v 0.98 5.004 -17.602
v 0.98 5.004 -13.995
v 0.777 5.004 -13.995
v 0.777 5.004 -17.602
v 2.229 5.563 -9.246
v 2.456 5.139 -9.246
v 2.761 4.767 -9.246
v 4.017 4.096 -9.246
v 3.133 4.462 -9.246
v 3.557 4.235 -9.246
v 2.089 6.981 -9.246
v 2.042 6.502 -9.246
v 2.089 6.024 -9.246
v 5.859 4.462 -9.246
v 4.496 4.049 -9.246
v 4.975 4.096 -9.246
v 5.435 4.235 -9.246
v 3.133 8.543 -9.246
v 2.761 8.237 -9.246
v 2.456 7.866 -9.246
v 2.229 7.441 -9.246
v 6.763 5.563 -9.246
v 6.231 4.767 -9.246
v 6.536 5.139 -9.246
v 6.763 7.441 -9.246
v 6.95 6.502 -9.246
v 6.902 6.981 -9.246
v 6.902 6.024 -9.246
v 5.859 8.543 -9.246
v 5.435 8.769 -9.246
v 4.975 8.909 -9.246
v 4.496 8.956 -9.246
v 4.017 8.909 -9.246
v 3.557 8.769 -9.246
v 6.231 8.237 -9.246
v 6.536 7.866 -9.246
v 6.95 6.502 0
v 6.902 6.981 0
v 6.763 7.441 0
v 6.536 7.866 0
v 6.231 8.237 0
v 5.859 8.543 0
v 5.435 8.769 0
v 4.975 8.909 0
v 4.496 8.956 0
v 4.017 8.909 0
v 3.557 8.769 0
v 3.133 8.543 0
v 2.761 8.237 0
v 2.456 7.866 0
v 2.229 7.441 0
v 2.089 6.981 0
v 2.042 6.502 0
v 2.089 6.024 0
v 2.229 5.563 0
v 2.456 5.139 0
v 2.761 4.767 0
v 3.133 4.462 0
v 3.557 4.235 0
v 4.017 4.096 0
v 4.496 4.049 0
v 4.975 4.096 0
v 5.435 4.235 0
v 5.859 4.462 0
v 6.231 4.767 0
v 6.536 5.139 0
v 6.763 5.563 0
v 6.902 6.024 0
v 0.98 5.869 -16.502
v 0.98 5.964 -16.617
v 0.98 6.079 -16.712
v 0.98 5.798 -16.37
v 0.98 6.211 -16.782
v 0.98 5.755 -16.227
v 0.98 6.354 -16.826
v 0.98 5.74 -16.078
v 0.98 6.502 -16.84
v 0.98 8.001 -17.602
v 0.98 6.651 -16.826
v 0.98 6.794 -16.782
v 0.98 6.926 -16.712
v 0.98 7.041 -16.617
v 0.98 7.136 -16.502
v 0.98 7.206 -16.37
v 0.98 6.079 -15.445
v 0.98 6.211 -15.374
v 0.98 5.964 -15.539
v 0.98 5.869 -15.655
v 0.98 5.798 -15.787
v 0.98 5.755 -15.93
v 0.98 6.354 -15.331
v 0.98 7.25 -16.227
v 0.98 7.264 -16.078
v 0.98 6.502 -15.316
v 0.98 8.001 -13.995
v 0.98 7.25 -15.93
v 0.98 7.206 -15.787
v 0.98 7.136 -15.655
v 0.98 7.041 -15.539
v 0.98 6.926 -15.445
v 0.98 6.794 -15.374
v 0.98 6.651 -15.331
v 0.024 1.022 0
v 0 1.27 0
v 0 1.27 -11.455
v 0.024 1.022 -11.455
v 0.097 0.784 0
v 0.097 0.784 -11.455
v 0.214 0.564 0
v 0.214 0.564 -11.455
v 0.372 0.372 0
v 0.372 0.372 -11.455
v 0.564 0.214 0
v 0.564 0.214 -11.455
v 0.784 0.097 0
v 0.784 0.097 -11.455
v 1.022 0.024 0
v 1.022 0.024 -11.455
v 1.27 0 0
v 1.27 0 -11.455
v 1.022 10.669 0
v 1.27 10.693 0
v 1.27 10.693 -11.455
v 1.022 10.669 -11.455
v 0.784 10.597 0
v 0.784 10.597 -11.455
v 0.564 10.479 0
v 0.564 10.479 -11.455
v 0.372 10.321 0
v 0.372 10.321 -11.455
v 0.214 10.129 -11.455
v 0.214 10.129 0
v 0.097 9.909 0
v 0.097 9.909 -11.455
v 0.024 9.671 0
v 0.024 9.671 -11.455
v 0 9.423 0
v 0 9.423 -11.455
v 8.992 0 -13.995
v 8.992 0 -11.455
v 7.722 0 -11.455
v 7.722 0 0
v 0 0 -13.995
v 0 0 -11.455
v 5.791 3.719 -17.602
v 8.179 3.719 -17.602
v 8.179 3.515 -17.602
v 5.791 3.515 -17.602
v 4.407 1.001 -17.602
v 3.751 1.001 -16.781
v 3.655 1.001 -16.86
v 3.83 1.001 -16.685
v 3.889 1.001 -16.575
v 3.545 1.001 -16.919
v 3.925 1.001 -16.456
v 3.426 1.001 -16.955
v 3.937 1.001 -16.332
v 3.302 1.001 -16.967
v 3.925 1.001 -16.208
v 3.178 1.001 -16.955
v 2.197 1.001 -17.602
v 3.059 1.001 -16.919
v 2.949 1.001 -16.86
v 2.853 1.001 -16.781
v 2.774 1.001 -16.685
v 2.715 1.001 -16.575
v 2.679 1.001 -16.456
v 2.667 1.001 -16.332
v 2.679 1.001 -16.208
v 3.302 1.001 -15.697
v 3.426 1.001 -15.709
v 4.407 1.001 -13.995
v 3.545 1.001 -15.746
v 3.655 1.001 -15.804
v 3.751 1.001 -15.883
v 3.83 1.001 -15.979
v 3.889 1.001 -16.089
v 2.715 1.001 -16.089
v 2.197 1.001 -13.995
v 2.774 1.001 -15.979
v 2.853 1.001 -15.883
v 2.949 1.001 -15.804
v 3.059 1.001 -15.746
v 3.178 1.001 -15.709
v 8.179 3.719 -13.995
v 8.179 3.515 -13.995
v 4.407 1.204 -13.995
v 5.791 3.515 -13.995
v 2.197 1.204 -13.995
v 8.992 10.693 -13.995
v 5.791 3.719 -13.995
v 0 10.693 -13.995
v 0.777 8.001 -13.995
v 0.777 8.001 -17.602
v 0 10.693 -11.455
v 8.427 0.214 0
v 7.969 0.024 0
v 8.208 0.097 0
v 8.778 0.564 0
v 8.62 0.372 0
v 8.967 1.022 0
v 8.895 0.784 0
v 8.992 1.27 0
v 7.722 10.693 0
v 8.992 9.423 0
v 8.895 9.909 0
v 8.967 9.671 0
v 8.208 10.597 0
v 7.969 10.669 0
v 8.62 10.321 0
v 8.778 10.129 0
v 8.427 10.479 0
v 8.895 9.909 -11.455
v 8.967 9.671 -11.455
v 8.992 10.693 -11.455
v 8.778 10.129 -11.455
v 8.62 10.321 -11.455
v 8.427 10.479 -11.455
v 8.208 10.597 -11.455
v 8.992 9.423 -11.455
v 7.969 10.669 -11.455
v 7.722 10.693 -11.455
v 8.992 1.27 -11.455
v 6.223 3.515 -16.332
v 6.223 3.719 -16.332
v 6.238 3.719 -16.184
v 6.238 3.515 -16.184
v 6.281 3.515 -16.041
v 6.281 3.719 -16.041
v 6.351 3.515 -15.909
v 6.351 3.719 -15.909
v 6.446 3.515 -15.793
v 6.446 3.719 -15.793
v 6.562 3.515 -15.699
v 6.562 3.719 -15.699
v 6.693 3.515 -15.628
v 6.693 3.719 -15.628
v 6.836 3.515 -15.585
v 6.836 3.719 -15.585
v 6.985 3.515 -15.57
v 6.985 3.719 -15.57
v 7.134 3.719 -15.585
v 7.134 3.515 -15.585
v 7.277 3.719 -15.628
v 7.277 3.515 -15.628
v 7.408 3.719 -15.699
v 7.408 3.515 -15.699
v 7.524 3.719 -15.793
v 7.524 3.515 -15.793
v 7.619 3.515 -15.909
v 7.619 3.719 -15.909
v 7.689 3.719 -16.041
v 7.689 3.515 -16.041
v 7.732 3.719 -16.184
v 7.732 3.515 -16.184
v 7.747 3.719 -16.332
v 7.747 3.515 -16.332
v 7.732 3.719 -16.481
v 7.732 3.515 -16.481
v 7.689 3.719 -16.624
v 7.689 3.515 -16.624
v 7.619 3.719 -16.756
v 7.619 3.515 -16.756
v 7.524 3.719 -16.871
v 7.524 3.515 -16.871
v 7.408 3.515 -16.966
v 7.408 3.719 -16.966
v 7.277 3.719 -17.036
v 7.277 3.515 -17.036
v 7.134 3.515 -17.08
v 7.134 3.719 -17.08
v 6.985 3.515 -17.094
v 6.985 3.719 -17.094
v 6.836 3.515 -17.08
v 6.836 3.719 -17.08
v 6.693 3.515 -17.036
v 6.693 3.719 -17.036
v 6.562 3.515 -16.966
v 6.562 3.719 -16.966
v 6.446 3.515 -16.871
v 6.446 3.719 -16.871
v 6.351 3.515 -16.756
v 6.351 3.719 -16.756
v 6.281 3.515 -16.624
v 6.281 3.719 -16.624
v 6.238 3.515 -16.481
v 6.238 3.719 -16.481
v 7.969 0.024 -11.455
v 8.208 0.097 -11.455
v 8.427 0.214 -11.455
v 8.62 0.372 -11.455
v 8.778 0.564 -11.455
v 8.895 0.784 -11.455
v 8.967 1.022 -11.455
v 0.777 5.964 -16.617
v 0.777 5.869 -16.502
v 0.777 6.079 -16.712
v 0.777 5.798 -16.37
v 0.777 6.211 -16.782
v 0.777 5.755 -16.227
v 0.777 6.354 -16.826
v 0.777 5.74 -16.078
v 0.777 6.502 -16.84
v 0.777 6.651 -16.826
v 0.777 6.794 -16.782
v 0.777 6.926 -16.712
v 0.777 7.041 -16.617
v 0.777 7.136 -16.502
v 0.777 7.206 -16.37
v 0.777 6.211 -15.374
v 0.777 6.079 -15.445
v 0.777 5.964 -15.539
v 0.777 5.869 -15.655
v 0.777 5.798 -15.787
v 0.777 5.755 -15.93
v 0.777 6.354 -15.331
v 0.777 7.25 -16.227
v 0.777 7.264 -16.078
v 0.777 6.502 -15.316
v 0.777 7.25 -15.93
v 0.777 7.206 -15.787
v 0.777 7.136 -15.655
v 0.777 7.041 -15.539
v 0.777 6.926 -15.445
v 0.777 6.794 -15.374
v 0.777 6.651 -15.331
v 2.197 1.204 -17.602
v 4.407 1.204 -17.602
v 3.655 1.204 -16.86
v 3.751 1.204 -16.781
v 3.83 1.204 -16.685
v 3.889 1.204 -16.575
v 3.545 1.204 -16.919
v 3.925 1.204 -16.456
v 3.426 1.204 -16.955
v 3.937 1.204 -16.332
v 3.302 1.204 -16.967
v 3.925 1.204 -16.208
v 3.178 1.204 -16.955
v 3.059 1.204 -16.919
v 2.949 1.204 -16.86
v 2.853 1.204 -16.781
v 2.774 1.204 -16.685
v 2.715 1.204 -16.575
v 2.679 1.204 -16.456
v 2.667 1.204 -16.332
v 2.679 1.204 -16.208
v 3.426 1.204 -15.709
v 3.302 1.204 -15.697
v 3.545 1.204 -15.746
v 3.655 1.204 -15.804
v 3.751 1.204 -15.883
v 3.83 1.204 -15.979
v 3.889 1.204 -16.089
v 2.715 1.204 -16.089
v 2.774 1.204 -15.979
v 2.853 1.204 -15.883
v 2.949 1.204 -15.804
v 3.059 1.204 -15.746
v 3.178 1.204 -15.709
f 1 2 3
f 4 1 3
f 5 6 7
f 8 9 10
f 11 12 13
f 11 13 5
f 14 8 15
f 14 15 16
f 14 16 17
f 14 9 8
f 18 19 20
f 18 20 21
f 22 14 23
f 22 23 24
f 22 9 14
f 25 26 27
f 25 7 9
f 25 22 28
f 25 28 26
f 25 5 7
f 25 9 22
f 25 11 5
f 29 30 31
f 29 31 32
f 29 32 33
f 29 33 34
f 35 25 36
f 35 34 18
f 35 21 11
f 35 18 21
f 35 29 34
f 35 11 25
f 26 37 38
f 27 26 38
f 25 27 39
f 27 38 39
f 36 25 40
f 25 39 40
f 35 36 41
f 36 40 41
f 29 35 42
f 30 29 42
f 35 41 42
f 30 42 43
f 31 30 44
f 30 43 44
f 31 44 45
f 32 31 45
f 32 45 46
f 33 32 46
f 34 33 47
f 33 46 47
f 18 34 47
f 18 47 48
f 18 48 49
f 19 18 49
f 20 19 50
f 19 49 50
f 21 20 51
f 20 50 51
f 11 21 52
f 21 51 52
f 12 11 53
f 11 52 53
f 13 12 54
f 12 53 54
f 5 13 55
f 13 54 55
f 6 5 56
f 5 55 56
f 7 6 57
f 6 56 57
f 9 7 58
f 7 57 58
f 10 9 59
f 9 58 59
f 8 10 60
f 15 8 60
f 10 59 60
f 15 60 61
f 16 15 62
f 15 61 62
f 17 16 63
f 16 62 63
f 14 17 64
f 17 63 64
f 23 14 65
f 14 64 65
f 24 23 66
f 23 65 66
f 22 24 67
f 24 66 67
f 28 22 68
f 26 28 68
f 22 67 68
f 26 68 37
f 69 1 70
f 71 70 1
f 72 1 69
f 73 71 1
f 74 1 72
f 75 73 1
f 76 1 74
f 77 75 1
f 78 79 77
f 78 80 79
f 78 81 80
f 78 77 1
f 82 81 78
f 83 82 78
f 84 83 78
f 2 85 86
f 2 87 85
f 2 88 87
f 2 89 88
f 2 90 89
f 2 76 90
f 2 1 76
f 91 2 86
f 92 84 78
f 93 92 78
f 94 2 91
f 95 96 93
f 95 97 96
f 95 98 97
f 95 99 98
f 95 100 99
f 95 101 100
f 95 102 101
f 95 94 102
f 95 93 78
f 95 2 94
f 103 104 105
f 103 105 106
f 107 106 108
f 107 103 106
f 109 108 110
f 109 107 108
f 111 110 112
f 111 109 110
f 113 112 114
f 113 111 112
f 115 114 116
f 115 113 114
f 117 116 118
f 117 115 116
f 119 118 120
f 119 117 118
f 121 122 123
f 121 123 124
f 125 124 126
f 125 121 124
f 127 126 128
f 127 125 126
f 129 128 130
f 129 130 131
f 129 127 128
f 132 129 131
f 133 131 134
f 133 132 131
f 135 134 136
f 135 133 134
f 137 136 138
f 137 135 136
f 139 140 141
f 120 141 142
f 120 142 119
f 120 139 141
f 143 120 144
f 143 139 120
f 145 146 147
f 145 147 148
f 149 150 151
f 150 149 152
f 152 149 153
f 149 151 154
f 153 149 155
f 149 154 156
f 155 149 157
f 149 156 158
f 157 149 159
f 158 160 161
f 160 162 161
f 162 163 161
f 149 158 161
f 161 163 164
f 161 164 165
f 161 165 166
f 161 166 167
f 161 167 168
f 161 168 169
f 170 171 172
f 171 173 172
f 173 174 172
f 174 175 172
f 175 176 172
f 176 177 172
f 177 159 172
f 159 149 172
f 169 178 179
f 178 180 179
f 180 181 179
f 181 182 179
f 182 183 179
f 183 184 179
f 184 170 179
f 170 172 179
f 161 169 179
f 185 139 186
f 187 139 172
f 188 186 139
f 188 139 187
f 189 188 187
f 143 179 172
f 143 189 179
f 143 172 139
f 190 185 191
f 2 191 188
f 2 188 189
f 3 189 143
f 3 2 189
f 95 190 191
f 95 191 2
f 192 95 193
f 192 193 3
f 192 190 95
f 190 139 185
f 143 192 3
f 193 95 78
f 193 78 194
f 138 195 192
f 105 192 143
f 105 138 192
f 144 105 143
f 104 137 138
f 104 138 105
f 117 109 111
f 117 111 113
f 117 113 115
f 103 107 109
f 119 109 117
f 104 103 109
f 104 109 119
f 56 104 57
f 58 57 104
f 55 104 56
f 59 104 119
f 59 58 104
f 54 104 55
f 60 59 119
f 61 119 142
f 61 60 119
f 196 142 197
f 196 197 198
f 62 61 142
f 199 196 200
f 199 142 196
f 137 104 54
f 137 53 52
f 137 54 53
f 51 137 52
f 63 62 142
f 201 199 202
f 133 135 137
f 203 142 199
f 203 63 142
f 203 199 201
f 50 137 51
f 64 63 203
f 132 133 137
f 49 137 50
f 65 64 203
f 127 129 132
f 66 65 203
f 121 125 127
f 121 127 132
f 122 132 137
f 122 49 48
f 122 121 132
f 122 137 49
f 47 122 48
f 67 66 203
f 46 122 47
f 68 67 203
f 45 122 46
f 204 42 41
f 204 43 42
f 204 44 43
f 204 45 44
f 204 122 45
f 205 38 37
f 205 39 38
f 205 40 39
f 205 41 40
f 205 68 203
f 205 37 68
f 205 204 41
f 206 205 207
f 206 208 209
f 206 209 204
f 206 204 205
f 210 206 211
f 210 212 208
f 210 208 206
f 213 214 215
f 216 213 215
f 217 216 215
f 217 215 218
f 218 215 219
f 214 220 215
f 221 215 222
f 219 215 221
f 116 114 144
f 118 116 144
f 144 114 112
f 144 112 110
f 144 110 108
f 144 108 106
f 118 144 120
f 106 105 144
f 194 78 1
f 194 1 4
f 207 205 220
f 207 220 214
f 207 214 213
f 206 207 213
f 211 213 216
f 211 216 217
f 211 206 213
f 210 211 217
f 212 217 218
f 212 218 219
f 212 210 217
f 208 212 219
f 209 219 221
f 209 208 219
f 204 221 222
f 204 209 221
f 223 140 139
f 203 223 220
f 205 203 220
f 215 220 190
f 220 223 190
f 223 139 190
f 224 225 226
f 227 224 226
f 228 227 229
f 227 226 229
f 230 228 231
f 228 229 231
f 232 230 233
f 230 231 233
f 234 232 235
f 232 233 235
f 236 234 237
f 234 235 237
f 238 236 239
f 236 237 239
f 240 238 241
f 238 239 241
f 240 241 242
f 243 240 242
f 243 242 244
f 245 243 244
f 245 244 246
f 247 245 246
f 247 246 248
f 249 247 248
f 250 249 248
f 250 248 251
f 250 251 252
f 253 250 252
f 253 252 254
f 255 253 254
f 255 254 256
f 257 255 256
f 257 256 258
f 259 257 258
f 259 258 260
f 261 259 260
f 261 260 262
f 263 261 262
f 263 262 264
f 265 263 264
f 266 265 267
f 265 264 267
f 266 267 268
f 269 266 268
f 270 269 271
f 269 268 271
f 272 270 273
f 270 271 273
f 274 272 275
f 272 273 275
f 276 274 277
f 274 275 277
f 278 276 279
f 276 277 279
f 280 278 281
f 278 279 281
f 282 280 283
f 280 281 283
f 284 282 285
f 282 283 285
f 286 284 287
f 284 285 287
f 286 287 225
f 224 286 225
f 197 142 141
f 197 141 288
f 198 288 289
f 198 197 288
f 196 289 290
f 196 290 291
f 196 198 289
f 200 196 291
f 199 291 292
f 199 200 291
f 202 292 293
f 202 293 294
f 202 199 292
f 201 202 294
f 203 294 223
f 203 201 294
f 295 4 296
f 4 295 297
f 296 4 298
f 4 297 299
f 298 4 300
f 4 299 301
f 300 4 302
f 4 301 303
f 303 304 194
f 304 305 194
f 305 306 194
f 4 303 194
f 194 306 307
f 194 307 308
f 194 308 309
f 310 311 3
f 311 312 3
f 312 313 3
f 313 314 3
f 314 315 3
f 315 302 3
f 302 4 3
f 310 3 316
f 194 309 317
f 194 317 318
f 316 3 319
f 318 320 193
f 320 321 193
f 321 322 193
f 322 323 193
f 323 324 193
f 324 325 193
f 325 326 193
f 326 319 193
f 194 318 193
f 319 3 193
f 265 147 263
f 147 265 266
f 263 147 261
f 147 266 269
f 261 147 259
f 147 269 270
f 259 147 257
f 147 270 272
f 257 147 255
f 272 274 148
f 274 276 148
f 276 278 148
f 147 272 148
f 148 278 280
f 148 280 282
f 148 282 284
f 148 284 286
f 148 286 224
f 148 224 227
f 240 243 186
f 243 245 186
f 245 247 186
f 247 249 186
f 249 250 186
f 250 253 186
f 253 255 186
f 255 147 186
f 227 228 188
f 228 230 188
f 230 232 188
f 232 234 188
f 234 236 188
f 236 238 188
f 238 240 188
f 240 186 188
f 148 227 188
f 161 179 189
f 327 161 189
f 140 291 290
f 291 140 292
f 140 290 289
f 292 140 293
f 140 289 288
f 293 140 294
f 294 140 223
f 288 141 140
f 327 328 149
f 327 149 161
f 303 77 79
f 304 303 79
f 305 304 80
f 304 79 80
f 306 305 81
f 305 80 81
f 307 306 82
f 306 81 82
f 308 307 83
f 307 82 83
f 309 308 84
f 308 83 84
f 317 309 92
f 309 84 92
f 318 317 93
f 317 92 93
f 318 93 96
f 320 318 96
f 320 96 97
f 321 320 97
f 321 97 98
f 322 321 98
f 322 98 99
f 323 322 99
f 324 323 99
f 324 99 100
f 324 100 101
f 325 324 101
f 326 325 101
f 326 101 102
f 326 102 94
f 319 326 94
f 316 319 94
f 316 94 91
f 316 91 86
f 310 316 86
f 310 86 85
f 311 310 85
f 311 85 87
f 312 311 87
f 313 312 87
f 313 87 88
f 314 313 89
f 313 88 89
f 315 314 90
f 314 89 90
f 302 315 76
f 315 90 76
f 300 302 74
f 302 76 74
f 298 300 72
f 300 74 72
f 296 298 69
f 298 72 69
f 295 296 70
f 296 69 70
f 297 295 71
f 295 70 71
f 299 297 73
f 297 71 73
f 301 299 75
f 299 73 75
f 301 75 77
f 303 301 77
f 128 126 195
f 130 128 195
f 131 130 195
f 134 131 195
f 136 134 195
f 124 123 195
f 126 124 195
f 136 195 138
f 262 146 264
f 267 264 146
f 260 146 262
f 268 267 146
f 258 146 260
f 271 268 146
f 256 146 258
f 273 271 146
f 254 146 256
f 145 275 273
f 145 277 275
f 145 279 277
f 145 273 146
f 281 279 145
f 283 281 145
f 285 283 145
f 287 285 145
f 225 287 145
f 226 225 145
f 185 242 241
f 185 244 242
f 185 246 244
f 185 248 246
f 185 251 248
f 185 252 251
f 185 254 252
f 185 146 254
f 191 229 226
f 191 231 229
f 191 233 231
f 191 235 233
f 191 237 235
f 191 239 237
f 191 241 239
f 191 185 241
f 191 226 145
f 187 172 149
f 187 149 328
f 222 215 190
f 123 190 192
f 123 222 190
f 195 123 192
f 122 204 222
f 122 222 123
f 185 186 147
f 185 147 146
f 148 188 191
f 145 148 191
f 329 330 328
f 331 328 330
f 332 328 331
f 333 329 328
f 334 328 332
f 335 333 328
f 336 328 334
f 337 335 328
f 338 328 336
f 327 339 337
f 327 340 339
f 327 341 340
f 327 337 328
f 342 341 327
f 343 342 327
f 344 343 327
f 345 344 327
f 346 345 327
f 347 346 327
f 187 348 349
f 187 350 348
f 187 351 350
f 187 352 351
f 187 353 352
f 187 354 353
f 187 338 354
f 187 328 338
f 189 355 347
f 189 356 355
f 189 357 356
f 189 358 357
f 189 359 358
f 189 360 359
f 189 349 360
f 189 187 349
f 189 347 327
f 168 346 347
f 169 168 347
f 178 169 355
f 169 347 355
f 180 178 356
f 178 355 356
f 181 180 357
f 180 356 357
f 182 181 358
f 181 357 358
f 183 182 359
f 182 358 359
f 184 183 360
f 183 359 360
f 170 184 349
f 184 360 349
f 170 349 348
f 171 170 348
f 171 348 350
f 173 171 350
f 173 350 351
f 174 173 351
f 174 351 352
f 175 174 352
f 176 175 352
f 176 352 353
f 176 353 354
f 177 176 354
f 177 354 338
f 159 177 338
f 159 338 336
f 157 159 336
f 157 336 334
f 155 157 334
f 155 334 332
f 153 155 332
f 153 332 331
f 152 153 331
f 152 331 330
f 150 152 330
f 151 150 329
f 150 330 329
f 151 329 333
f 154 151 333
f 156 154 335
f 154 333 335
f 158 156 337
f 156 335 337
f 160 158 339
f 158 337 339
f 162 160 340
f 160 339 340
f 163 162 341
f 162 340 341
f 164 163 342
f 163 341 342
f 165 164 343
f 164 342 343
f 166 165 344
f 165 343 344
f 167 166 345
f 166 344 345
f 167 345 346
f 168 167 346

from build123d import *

# Parameters (mm, degrees)
BOSS_EXTRUDE1_DEPTH = 13.9954
SKETCH2_R           = 2.453758577
CUT_EXTRUDE1_DEPTH  = 9.2456
SKETCH3_W           = 8.9916
SKETCH3_H           = 10.6934
BOSS_EXTRUDE2_DEPTH = 2.54
SKETCH4_W           = 0.2032
SKETCH4_H           = 2.9972
SKETCH4_W_2         = 2.2098
SKETCH4_H_2         = 0.2032
SKETCH4_W_3         = 2.3876
BOSS_EXTRUDE3_DEPTH = 3.6068
CUT_EXTRUDE2_REACH  = 24.099
SKETCH5_R           = 0.762
CUT_EXTRUDE3_REACH  = 22.96
SKETCH6_R           = 0.762
CUT_EXTRUDE4_REACH  = 23.926
SKETCH7_R           = 0.635


with BuildPart() as part:
    # Sketch1 → Boss-Extrude1 (new body)
    with BuildSketch(Plane.XY):
        with BuildLine():
            Line((1.27, 0), (7.7216, 0))
            ThreePointArc((7.7216, 0), (8.619625612, 0.371974388), (8.9916, 1.27))
            Line((8.9916, 1.27), (8.9916, 9.4234))
            ThreePointArc((8.9916, 9.4234), (8.619625612, 10.321425612), (7.7216, 10.6934))
            Line((7.7216, 10.6934), (1.27, 10.6934))
            ThreePointArc((1.27, 10.6934), (0.371974388, 10.321425612), (0, 9.4234))
            Line((0, 9.4234), (0, 1.27))
            ThreePointArc((0, 1.27), (0.371974388, 0.371974388), (1.27, 0))
        make_face()
    extrude(amount=-BOSS_EXTRUDE1_DEPTH)

    # Sketch2 → Cut-Extrude1 (cut)
    with BuildSketch(Plane.XY):
        with Locations((4.4958, 6.5024)):
            Circle(SKETCH2_R)
    extrude(amount=-CUT_EXTRUDE1_DEPTH, mode=Mode.SUBTRACT)

    # Sketch3 → Boss-Extrude2 (add)
    with BuildSketch(Plane(origin=(0, 0, -13.9954), x_dir=(-1, 0, 0), z_dir=(0, 0, -1))):
        with Locations((-4.4958, 5.3467)):
            Rectangle(SKETCH3_W, SKETCH3_H)
    extrude(amount=-BOSS_EXTRUDE2_DEPTH)

    # Sketch4 → Boss-Extrude3 (add)
    with BuildSketch(Plane(origin=(0, 0, -13.9954), x_dir=(-1, 0, 0), z_dir=(0, 0, -1))):
        with Locations((-0.87884, 6.5024)):
            Rectangle(SKETCH4_W, SKETCH4_H)
        with Locations((-3.302, 1.10236)):
            Rectangle(SKETCH4_W_2, SKETCH4_H_2)
        with Locations((-6.985, 3.61696)):
            Rectangle(SKETCH4_W_3, SKETCH4_H_2)
    extrude(amount=BOSS_EXTRUDE3_DEPTH)

    # Sketch5 → Cut-Extrude2 (cut, up to next)
    with BuildSketch(Plane(origin=(0.98044, 0, 0), x_dir=(0, 0, -1), z_dir=(1, 0, 0)), mode=Mode.PRIVATE) as cut_extrude2_sk1:
        with Locations((16.0782, 6.5024)):
            Circle(SKETCH5_R)
    cut_extrude2_tool1 = extrude(cut_extrude2_sk1.sketch, amount=-CUT_EXTRUDE2_REACH, mode=Mode.PRIVATE) & part.part
    add(cut_extrude2_tool1.solids().sort_by_distance((0.98044, 6.5024, -16.0782))[0], mode=Mode.SUBTRACT)

    # Sketch6 → Cut-Extrude3 (cut, up to next)
    with BuildSketch(Plane(origin=(0, 3.71856, 0), x_dir=(1, 0, 0), z_dir=(0, 1, 0)), mode=Mode.PRIVATE) as cut_extrude3_sk1:
        with Locations(Location((6.985, 16.3322, 0), (0, 0, 180))):
            Circle(SKETCH6_R)
    cut_extrude3_tool1 = extrude(cut_extrude3_sk1.sketch, amount=-CUT_EXTRUDE3_REACH, mode=Mode.PRIVATE) & part.part
    add(cut_extrude3_tool1.solids().sort_by_distance((6.985, 3.71856, -16.3322))[0], mode=Mode.SUBTRACT)

    # Sketch7 → Cut-Extrude4 (cut, up to next)
    with BuildSketch(Plane(origin=(0, 1.20396, 0), x_dir=(1, 0, 0), z_dir=(0, 1, 0)), mode=Mode.PRIVATE) as cut_extrude4_sk1:
        with Locations(Location((3.302, 16.3322, 0), (0, 0, 180))):
            Circle(SKETCH7_R)
    cut_extrude4_tool1 = extrude(cut_extrude4_sk1.sketch, amount=-CUT_EXTRUDE4_REACH, mode=Mode.PRIVATE) & part.part
    add(cut_extrude4_tool1.solids().sort_by_distance((3.302, 1.20396, -16.3322))[0], mode=Mode.SUBTRACT)


solid = part.part
